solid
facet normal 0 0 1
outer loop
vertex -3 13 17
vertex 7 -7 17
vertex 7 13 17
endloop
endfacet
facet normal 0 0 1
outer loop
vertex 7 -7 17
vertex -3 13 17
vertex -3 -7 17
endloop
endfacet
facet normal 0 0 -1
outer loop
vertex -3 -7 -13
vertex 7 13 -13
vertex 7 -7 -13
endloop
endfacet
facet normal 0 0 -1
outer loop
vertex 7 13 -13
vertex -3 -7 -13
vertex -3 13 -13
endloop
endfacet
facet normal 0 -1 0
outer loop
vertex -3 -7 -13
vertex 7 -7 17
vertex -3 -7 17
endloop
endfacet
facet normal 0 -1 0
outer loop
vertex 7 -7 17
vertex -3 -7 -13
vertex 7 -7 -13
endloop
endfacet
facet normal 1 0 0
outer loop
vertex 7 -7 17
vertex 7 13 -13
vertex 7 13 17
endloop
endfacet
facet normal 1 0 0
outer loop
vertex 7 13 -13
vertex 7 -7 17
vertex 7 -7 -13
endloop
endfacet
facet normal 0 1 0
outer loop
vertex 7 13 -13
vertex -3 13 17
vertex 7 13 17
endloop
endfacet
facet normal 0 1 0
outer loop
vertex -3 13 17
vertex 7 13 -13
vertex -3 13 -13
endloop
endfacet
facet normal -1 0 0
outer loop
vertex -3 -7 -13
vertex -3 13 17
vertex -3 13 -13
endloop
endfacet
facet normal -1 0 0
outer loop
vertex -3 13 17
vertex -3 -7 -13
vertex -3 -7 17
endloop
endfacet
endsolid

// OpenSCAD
/*
 * OpenSCAD generator of the example data STL files.
 */

/* *************************************************************** *
 * CUSTOMIZER VALUES
 * *************************************************************** */

/* [General] */

SELECTED_COMPONENT = "cube"; // [cube, sphere]

/* [Quality] */

// Minimum angle for a fragment
$fa = 1.0; // .1

// Minimum size of a fragment
$fs = 2; // .01

// Number of fragments
$fn = 0;


/* [Hidden] */


/* *************************************************************** *
 * CUBE
 * *************************************************************** */
module example_cube() {
    translate([-3, -7, -13])
    cube([10, 20, 30]);
}


/* *************************************************************** *
 * SPHERE
 * *************************************************************** */
module example_sphere() {
    translate([3, -7, 13])
    sphere(r = 10);
}


/* *************************************************************** *
 * SHOW PARTS
 * *************************************************************** */
if (SELECTED_COMPONENT == "cube") {
    example_cube();
}

if (SELECTED_COMPONENT == "sphere") {
    example_sphere();
}
